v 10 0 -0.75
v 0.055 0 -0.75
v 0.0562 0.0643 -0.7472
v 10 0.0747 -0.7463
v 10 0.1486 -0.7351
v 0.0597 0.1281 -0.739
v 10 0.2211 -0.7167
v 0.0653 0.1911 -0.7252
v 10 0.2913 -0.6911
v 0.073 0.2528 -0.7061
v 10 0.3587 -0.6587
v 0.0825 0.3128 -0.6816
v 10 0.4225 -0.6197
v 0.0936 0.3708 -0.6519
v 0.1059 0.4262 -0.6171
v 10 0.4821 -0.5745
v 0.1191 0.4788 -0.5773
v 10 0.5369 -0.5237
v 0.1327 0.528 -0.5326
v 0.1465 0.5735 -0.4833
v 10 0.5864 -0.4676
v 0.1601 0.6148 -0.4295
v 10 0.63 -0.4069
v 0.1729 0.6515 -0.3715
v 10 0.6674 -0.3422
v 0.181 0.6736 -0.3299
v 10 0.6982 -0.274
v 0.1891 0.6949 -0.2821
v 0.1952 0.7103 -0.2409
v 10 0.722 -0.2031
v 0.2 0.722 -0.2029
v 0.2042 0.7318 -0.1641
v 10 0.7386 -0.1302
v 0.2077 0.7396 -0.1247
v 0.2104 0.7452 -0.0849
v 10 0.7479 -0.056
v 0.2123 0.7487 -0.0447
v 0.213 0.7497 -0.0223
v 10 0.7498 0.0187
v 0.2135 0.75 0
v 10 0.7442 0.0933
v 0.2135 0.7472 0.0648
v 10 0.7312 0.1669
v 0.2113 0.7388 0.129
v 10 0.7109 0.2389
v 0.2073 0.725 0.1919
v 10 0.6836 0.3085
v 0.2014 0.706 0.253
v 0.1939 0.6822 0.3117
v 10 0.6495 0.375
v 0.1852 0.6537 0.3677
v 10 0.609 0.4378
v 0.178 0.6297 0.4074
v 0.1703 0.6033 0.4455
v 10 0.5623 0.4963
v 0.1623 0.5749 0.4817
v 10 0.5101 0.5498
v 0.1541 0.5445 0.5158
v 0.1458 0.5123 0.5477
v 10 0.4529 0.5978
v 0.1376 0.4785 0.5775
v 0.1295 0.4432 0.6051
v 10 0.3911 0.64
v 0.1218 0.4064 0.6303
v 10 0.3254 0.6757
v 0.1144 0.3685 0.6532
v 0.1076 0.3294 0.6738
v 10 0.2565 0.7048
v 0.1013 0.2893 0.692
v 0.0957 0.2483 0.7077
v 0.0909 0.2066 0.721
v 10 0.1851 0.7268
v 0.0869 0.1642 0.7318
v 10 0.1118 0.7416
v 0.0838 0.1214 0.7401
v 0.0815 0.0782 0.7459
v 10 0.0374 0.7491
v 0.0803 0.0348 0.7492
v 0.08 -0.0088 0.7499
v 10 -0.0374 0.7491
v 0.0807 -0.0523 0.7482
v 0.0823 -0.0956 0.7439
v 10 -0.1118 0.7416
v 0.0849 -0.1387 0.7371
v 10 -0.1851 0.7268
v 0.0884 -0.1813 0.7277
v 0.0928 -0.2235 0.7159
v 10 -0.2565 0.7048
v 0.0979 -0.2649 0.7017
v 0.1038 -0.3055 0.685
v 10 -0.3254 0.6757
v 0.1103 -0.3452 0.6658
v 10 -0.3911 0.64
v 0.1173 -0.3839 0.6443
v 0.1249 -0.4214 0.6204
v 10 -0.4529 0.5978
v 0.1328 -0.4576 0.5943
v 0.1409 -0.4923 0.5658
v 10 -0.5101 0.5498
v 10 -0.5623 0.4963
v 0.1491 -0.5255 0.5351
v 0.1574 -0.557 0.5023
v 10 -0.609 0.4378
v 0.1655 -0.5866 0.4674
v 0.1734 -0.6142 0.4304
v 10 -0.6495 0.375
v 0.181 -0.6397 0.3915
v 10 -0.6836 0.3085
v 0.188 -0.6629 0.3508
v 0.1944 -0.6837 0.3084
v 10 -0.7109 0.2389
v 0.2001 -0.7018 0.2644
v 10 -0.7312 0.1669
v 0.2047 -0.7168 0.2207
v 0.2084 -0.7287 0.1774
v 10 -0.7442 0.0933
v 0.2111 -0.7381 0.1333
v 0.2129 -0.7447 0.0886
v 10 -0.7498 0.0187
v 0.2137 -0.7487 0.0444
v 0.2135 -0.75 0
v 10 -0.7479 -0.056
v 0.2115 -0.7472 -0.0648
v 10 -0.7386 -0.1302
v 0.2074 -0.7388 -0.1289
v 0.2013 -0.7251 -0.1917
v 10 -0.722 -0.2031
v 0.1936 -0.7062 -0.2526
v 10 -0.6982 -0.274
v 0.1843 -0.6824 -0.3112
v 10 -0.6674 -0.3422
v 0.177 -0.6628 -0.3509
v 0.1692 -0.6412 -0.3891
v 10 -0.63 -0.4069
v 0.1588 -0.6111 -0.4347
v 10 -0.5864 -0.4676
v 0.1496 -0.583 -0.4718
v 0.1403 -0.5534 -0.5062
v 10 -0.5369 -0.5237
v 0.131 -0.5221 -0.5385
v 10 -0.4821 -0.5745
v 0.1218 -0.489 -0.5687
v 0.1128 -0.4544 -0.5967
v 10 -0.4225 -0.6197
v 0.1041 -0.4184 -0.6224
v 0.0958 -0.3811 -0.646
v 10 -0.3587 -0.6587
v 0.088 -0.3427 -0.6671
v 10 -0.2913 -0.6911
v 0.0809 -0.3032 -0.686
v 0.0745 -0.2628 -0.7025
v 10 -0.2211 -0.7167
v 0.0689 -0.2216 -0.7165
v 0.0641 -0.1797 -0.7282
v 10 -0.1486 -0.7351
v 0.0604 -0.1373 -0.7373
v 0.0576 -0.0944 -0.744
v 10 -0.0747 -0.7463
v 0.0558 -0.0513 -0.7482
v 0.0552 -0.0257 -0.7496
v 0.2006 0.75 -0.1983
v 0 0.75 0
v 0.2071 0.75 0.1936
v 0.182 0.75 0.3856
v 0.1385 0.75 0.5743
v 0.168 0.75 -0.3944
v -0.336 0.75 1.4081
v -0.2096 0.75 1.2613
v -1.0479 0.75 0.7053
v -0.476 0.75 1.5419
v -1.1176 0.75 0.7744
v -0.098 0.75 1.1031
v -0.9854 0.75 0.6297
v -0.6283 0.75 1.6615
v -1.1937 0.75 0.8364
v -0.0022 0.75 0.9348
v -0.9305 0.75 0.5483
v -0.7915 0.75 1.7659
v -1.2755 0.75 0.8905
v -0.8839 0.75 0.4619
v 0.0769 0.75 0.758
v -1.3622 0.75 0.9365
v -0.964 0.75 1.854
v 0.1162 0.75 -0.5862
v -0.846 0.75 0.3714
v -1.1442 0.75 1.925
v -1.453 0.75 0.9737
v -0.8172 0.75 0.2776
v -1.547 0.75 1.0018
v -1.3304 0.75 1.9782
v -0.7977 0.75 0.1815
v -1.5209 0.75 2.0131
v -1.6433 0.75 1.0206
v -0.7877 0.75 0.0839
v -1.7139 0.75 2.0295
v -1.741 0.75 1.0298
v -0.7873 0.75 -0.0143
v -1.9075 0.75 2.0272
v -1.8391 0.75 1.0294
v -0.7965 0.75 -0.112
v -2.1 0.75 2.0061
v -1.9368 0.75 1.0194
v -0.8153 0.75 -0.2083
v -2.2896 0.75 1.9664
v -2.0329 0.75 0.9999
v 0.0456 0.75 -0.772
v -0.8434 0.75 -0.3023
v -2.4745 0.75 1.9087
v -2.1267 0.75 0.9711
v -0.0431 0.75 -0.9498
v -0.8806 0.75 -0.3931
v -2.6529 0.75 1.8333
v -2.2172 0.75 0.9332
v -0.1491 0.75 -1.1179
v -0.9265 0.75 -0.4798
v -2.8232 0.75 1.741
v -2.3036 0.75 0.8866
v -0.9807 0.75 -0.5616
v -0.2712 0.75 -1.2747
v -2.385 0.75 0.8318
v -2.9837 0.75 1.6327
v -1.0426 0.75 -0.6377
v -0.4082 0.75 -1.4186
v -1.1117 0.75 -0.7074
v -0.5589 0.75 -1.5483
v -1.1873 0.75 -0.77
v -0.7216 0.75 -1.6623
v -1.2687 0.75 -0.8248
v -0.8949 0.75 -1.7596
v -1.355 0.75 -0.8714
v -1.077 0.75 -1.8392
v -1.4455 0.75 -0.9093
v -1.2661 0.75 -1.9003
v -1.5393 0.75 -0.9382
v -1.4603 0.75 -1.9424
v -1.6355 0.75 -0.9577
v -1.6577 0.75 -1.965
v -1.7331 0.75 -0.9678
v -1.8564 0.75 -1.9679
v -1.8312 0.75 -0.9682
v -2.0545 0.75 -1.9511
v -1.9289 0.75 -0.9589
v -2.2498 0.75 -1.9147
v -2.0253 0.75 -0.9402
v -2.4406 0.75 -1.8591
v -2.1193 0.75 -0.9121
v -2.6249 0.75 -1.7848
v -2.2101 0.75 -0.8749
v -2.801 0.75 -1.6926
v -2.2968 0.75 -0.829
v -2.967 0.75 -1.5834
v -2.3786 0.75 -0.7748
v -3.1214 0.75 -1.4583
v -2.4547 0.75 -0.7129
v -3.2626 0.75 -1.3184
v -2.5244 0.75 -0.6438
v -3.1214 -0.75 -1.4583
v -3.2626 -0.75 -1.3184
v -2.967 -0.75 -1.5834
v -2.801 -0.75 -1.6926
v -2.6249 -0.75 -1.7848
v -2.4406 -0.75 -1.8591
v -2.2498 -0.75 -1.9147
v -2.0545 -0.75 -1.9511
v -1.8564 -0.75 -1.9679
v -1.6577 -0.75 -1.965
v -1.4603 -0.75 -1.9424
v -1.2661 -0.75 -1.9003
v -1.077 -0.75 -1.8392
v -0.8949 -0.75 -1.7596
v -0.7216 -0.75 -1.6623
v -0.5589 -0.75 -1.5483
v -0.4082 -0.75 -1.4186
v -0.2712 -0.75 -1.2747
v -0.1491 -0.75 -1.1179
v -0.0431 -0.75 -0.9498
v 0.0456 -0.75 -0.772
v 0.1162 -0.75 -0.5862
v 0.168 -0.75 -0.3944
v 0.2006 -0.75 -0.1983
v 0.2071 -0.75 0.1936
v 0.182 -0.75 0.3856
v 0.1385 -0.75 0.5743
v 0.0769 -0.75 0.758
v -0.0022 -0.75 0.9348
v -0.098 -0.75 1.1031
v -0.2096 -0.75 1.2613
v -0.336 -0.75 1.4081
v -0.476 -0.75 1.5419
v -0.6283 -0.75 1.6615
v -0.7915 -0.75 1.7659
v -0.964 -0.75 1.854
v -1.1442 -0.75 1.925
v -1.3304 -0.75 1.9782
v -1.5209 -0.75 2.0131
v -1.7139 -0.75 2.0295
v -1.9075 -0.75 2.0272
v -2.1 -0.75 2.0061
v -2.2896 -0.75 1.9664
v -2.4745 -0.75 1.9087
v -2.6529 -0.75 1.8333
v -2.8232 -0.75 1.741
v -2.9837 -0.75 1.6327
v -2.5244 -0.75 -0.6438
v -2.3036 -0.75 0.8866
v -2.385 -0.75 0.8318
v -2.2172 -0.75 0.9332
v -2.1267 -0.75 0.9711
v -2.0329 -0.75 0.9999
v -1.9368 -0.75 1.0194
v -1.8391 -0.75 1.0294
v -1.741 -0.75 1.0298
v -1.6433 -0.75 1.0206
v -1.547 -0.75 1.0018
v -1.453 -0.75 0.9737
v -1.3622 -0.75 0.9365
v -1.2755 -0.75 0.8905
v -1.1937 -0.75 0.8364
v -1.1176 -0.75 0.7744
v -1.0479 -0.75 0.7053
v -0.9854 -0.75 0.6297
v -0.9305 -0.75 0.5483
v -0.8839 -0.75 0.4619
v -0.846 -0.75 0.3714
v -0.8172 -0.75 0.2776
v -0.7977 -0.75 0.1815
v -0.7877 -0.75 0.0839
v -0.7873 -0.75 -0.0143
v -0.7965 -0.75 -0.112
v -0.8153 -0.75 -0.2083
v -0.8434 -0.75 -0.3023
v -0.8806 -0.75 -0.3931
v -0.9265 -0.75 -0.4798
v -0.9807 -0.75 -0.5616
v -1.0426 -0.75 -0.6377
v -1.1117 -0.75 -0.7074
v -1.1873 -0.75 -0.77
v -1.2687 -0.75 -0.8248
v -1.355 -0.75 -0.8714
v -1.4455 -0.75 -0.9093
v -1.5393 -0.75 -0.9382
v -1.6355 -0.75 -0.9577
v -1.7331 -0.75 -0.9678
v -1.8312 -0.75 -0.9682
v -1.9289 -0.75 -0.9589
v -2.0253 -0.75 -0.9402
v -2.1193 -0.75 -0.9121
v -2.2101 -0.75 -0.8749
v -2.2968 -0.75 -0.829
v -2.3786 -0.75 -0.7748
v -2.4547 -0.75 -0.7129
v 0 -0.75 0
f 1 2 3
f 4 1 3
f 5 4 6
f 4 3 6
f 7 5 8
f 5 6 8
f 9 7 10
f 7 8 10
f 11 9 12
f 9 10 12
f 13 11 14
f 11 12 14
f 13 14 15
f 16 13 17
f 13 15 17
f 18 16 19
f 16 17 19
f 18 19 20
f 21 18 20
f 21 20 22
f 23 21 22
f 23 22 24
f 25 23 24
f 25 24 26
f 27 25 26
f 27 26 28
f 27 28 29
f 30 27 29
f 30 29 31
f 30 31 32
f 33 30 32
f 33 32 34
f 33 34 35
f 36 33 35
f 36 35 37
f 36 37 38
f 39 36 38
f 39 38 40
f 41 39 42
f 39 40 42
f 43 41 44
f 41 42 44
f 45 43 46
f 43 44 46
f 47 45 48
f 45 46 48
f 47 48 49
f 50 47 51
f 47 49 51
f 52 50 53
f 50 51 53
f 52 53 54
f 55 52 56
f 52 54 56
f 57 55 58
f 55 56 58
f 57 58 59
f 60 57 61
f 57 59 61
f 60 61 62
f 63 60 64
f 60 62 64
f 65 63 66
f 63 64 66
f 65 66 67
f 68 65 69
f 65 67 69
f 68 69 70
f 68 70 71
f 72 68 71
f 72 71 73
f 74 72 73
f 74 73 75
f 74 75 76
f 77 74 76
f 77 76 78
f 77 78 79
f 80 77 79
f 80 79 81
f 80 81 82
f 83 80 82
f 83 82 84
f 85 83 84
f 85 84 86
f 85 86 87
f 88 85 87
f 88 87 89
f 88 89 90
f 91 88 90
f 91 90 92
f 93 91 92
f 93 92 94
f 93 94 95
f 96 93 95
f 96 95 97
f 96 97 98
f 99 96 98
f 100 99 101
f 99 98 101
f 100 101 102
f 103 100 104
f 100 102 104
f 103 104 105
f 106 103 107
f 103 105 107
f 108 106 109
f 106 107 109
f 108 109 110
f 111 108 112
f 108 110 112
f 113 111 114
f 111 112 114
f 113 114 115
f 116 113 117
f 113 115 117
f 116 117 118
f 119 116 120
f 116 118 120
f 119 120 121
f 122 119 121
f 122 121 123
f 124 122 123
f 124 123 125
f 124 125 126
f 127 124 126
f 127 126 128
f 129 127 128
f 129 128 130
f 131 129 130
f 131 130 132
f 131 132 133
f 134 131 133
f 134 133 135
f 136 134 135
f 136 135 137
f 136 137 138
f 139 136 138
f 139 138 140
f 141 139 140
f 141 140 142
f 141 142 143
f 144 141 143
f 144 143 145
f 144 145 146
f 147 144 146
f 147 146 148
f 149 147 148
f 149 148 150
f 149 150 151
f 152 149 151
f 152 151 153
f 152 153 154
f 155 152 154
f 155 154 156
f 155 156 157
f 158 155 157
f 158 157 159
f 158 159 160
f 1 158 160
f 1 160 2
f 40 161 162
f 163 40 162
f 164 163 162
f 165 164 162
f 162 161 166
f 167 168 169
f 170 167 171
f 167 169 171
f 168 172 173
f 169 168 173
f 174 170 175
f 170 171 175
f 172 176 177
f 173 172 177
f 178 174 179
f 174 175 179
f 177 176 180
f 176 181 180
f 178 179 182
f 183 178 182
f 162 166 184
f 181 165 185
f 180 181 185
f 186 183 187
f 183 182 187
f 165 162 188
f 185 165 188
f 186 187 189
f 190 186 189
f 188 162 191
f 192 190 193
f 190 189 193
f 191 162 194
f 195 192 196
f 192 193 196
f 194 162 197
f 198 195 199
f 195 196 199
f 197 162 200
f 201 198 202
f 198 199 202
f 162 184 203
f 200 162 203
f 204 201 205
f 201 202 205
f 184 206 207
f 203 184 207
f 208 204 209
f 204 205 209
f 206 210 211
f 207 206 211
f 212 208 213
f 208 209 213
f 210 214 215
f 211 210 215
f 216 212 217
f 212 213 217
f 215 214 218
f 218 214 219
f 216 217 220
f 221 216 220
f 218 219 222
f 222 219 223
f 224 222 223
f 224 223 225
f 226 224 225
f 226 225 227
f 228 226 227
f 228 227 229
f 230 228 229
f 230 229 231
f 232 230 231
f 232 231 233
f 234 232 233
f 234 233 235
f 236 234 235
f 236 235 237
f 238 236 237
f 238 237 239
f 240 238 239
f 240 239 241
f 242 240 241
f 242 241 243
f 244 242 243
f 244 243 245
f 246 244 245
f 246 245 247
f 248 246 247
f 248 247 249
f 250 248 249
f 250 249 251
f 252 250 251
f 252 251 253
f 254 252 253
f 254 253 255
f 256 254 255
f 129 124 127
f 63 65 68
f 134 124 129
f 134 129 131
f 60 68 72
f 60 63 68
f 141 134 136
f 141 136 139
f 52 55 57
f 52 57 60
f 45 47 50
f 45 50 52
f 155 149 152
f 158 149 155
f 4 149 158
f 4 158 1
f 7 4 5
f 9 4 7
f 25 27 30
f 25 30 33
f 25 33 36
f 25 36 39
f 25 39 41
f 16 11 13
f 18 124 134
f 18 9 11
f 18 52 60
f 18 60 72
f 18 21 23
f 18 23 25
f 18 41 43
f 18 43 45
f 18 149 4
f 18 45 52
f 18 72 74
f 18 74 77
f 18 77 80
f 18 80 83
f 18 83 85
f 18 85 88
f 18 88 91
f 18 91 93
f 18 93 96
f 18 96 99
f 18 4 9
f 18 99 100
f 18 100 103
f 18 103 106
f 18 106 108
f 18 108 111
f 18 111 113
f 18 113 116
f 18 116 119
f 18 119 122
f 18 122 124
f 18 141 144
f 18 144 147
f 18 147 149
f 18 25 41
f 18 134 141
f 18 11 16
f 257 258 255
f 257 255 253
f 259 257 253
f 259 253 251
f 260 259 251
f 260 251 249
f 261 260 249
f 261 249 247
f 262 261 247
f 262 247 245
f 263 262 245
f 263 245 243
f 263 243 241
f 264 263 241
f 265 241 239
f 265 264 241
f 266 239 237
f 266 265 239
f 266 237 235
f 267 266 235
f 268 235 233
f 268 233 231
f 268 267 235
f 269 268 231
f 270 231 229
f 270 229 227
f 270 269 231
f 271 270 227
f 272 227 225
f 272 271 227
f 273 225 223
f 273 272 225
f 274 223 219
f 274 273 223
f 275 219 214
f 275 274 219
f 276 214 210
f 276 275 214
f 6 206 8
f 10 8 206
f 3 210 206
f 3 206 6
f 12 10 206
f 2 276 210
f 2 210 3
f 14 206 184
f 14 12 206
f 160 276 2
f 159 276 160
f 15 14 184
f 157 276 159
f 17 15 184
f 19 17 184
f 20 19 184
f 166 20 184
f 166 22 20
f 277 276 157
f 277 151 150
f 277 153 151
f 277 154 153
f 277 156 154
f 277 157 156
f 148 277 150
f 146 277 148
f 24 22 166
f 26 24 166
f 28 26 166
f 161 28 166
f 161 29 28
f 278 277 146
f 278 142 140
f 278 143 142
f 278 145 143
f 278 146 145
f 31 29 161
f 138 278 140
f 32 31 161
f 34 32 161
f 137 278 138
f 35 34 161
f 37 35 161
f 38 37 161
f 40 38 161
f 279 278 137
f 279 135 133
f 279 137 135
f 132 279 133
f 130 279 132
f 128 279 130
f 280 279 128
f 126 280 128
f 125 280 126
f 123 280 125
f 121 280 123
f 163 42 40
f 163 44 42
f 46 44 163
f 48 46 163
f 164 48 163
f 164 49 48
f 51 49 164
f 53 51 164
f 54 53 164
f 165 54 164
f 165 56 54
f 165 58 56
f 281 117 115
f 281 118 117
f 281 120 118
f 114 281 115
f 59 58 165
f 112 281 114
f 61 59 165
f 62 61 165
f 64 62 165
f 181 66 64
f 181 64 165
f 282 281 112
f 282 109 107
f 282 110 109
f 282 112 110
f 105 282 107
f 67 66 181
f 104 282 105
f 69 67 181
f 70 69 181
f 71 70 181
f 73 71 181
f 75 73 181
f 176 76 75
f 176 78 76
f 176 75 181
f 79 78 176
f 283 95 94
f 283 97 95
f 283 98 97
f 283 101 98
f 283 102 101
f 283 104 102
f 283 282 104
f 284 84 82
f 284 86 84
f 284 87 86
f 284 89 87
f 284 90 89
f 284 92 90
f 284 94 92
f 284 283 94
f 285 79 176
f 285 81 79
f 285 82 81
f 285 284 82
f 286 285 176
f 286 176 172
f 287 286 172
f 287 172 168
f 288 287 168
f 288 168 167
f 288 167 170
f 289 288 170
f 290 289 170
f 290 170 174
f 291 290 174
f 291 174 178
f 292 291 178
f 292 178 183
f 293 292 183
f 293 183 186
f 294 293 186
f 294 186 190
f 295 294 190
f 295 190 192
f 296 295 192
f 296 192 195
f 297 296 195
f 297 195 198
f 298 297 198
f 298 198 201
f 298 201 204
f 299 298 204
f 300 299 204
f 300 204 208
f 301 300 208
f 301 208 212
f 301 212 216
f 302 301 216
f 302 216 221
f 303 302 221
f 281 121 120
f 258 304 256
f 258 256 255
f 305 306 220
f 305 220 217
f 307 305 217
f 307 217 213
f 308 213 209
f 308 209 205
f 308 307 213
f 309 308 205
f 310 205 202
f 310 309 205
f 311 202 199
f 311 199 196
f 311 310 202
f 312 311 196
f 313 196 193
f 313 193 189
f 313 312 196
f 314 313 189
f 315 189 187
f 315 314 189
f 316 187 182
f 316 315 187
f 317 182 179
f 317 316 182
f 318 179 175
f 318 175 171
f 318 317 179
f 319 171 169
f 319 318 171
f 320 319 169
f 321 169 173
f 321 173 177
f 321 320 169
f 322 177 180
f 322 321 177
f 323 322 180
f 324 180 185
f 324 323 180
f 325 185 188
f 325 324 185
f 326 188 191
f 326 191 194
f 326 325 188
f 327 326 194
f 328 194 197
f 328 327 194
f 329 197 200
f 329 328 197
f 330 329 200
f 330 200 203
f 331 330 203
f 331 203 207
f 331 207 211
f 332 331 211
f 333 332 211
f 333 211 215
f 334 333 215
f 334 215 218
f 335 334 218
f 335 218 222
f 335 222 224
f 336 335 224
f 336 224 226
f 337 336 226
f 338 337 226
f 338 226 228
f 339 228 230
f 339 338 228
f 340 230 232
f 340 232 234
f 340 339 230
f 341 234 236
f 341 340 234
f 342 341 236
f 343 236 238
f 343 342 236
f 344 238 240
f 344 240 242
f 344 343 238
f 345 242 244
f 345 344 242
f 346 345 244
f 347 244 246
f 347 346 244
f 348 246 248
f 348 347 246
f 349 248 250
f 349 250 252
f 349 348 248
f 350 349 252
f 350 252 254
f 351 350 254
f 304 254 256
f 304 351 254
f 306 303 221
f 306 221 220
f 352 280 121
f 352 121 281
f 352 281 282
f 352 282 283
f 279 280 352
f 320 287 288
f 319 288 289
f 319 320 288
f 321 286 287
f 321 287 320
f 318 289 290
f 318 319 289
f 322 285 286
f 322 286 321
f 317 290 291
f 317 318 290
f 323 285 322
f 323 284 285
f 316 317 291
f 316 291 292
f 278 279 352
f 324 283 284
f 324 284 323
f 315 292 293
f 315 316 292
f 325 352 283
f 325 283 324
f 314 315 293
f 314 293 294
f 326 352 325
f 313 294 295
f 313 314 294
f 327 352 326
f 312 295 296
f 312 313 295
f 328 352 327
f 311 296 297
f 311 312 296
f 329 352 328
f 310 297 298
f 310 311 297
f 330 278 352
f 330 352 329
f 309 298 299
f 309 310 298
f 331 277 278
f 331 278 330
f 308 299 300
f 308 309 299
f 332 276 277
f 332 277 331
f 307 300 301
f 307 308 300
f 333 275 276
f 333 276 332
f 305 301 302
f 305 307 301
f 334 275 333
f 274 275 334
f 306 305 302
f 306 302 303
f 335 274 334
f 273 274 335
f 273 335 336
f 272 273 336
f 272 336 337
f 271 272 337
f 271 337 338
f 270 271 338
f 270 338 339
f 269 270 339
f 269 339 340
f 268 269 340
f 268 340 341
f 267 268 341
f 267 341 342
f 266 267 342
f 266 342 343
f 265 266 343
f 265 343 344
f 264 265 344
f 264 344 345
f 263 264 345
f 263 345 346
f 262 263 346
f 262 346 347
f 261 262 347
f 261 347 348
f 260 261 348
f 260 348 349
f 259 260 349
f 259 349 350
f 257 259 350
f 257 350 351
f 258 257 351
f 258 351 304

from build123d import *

# Parameters (mm, degrees)
SKETCH1_R                = 0.75
BOSS_EXTRUDE1_DEPTH      = 10
BOSS_EXTRUDE2_DEPTH      = 0.75
BOSS_EXTRUDE2_DEPTH_BACK = 0.75


with BuildPart() as part:
    # Sketch1 → Boss-Extrude1 (new body)
    with BuildSketch(Plane(origin=(0, 0, 0), x_dir=(0, 0, -1), z_dir=(1, 0, 0))):
        Circle(SKETCH1_R)
    extrude(amount=BOSS_EXTRUDE1_DEPTH)

    # Sketch7 → Boss-Extrude2 (add, two sides: drawn at the far end of the back side and taken through both)
    with BuildSketch(Plane(origin=(0, 0, 0), x_dir=(1, 0, 0), z_dir=(0, 1, 0)).offset(-BOSS_EXTRUDE2_DEPTH_BACK)):
        with BuildLine():
            Line((-2.524409689, 0.643789351), (-3.262573031, 1.318411378))
            ThreePointArc((-3.262573031, 1.318411378), (0.204884976, 0.157305716), (-2.983725986, -1.632719849))
            Line((-2.983725986, -1.632719849), (-2.384986166, -0.831776263))
            ThreePointArc((-2.384986166, -0.831776263), (-0.790680685, 0.06323652), (-2.524409689, 0.643789351))
        make_face()
    extrude(amount=BOSS_EXTRUDE2_DEPTH + BOSS_EXTRUDE2_DEPTH_BACK)


solid = part.part
